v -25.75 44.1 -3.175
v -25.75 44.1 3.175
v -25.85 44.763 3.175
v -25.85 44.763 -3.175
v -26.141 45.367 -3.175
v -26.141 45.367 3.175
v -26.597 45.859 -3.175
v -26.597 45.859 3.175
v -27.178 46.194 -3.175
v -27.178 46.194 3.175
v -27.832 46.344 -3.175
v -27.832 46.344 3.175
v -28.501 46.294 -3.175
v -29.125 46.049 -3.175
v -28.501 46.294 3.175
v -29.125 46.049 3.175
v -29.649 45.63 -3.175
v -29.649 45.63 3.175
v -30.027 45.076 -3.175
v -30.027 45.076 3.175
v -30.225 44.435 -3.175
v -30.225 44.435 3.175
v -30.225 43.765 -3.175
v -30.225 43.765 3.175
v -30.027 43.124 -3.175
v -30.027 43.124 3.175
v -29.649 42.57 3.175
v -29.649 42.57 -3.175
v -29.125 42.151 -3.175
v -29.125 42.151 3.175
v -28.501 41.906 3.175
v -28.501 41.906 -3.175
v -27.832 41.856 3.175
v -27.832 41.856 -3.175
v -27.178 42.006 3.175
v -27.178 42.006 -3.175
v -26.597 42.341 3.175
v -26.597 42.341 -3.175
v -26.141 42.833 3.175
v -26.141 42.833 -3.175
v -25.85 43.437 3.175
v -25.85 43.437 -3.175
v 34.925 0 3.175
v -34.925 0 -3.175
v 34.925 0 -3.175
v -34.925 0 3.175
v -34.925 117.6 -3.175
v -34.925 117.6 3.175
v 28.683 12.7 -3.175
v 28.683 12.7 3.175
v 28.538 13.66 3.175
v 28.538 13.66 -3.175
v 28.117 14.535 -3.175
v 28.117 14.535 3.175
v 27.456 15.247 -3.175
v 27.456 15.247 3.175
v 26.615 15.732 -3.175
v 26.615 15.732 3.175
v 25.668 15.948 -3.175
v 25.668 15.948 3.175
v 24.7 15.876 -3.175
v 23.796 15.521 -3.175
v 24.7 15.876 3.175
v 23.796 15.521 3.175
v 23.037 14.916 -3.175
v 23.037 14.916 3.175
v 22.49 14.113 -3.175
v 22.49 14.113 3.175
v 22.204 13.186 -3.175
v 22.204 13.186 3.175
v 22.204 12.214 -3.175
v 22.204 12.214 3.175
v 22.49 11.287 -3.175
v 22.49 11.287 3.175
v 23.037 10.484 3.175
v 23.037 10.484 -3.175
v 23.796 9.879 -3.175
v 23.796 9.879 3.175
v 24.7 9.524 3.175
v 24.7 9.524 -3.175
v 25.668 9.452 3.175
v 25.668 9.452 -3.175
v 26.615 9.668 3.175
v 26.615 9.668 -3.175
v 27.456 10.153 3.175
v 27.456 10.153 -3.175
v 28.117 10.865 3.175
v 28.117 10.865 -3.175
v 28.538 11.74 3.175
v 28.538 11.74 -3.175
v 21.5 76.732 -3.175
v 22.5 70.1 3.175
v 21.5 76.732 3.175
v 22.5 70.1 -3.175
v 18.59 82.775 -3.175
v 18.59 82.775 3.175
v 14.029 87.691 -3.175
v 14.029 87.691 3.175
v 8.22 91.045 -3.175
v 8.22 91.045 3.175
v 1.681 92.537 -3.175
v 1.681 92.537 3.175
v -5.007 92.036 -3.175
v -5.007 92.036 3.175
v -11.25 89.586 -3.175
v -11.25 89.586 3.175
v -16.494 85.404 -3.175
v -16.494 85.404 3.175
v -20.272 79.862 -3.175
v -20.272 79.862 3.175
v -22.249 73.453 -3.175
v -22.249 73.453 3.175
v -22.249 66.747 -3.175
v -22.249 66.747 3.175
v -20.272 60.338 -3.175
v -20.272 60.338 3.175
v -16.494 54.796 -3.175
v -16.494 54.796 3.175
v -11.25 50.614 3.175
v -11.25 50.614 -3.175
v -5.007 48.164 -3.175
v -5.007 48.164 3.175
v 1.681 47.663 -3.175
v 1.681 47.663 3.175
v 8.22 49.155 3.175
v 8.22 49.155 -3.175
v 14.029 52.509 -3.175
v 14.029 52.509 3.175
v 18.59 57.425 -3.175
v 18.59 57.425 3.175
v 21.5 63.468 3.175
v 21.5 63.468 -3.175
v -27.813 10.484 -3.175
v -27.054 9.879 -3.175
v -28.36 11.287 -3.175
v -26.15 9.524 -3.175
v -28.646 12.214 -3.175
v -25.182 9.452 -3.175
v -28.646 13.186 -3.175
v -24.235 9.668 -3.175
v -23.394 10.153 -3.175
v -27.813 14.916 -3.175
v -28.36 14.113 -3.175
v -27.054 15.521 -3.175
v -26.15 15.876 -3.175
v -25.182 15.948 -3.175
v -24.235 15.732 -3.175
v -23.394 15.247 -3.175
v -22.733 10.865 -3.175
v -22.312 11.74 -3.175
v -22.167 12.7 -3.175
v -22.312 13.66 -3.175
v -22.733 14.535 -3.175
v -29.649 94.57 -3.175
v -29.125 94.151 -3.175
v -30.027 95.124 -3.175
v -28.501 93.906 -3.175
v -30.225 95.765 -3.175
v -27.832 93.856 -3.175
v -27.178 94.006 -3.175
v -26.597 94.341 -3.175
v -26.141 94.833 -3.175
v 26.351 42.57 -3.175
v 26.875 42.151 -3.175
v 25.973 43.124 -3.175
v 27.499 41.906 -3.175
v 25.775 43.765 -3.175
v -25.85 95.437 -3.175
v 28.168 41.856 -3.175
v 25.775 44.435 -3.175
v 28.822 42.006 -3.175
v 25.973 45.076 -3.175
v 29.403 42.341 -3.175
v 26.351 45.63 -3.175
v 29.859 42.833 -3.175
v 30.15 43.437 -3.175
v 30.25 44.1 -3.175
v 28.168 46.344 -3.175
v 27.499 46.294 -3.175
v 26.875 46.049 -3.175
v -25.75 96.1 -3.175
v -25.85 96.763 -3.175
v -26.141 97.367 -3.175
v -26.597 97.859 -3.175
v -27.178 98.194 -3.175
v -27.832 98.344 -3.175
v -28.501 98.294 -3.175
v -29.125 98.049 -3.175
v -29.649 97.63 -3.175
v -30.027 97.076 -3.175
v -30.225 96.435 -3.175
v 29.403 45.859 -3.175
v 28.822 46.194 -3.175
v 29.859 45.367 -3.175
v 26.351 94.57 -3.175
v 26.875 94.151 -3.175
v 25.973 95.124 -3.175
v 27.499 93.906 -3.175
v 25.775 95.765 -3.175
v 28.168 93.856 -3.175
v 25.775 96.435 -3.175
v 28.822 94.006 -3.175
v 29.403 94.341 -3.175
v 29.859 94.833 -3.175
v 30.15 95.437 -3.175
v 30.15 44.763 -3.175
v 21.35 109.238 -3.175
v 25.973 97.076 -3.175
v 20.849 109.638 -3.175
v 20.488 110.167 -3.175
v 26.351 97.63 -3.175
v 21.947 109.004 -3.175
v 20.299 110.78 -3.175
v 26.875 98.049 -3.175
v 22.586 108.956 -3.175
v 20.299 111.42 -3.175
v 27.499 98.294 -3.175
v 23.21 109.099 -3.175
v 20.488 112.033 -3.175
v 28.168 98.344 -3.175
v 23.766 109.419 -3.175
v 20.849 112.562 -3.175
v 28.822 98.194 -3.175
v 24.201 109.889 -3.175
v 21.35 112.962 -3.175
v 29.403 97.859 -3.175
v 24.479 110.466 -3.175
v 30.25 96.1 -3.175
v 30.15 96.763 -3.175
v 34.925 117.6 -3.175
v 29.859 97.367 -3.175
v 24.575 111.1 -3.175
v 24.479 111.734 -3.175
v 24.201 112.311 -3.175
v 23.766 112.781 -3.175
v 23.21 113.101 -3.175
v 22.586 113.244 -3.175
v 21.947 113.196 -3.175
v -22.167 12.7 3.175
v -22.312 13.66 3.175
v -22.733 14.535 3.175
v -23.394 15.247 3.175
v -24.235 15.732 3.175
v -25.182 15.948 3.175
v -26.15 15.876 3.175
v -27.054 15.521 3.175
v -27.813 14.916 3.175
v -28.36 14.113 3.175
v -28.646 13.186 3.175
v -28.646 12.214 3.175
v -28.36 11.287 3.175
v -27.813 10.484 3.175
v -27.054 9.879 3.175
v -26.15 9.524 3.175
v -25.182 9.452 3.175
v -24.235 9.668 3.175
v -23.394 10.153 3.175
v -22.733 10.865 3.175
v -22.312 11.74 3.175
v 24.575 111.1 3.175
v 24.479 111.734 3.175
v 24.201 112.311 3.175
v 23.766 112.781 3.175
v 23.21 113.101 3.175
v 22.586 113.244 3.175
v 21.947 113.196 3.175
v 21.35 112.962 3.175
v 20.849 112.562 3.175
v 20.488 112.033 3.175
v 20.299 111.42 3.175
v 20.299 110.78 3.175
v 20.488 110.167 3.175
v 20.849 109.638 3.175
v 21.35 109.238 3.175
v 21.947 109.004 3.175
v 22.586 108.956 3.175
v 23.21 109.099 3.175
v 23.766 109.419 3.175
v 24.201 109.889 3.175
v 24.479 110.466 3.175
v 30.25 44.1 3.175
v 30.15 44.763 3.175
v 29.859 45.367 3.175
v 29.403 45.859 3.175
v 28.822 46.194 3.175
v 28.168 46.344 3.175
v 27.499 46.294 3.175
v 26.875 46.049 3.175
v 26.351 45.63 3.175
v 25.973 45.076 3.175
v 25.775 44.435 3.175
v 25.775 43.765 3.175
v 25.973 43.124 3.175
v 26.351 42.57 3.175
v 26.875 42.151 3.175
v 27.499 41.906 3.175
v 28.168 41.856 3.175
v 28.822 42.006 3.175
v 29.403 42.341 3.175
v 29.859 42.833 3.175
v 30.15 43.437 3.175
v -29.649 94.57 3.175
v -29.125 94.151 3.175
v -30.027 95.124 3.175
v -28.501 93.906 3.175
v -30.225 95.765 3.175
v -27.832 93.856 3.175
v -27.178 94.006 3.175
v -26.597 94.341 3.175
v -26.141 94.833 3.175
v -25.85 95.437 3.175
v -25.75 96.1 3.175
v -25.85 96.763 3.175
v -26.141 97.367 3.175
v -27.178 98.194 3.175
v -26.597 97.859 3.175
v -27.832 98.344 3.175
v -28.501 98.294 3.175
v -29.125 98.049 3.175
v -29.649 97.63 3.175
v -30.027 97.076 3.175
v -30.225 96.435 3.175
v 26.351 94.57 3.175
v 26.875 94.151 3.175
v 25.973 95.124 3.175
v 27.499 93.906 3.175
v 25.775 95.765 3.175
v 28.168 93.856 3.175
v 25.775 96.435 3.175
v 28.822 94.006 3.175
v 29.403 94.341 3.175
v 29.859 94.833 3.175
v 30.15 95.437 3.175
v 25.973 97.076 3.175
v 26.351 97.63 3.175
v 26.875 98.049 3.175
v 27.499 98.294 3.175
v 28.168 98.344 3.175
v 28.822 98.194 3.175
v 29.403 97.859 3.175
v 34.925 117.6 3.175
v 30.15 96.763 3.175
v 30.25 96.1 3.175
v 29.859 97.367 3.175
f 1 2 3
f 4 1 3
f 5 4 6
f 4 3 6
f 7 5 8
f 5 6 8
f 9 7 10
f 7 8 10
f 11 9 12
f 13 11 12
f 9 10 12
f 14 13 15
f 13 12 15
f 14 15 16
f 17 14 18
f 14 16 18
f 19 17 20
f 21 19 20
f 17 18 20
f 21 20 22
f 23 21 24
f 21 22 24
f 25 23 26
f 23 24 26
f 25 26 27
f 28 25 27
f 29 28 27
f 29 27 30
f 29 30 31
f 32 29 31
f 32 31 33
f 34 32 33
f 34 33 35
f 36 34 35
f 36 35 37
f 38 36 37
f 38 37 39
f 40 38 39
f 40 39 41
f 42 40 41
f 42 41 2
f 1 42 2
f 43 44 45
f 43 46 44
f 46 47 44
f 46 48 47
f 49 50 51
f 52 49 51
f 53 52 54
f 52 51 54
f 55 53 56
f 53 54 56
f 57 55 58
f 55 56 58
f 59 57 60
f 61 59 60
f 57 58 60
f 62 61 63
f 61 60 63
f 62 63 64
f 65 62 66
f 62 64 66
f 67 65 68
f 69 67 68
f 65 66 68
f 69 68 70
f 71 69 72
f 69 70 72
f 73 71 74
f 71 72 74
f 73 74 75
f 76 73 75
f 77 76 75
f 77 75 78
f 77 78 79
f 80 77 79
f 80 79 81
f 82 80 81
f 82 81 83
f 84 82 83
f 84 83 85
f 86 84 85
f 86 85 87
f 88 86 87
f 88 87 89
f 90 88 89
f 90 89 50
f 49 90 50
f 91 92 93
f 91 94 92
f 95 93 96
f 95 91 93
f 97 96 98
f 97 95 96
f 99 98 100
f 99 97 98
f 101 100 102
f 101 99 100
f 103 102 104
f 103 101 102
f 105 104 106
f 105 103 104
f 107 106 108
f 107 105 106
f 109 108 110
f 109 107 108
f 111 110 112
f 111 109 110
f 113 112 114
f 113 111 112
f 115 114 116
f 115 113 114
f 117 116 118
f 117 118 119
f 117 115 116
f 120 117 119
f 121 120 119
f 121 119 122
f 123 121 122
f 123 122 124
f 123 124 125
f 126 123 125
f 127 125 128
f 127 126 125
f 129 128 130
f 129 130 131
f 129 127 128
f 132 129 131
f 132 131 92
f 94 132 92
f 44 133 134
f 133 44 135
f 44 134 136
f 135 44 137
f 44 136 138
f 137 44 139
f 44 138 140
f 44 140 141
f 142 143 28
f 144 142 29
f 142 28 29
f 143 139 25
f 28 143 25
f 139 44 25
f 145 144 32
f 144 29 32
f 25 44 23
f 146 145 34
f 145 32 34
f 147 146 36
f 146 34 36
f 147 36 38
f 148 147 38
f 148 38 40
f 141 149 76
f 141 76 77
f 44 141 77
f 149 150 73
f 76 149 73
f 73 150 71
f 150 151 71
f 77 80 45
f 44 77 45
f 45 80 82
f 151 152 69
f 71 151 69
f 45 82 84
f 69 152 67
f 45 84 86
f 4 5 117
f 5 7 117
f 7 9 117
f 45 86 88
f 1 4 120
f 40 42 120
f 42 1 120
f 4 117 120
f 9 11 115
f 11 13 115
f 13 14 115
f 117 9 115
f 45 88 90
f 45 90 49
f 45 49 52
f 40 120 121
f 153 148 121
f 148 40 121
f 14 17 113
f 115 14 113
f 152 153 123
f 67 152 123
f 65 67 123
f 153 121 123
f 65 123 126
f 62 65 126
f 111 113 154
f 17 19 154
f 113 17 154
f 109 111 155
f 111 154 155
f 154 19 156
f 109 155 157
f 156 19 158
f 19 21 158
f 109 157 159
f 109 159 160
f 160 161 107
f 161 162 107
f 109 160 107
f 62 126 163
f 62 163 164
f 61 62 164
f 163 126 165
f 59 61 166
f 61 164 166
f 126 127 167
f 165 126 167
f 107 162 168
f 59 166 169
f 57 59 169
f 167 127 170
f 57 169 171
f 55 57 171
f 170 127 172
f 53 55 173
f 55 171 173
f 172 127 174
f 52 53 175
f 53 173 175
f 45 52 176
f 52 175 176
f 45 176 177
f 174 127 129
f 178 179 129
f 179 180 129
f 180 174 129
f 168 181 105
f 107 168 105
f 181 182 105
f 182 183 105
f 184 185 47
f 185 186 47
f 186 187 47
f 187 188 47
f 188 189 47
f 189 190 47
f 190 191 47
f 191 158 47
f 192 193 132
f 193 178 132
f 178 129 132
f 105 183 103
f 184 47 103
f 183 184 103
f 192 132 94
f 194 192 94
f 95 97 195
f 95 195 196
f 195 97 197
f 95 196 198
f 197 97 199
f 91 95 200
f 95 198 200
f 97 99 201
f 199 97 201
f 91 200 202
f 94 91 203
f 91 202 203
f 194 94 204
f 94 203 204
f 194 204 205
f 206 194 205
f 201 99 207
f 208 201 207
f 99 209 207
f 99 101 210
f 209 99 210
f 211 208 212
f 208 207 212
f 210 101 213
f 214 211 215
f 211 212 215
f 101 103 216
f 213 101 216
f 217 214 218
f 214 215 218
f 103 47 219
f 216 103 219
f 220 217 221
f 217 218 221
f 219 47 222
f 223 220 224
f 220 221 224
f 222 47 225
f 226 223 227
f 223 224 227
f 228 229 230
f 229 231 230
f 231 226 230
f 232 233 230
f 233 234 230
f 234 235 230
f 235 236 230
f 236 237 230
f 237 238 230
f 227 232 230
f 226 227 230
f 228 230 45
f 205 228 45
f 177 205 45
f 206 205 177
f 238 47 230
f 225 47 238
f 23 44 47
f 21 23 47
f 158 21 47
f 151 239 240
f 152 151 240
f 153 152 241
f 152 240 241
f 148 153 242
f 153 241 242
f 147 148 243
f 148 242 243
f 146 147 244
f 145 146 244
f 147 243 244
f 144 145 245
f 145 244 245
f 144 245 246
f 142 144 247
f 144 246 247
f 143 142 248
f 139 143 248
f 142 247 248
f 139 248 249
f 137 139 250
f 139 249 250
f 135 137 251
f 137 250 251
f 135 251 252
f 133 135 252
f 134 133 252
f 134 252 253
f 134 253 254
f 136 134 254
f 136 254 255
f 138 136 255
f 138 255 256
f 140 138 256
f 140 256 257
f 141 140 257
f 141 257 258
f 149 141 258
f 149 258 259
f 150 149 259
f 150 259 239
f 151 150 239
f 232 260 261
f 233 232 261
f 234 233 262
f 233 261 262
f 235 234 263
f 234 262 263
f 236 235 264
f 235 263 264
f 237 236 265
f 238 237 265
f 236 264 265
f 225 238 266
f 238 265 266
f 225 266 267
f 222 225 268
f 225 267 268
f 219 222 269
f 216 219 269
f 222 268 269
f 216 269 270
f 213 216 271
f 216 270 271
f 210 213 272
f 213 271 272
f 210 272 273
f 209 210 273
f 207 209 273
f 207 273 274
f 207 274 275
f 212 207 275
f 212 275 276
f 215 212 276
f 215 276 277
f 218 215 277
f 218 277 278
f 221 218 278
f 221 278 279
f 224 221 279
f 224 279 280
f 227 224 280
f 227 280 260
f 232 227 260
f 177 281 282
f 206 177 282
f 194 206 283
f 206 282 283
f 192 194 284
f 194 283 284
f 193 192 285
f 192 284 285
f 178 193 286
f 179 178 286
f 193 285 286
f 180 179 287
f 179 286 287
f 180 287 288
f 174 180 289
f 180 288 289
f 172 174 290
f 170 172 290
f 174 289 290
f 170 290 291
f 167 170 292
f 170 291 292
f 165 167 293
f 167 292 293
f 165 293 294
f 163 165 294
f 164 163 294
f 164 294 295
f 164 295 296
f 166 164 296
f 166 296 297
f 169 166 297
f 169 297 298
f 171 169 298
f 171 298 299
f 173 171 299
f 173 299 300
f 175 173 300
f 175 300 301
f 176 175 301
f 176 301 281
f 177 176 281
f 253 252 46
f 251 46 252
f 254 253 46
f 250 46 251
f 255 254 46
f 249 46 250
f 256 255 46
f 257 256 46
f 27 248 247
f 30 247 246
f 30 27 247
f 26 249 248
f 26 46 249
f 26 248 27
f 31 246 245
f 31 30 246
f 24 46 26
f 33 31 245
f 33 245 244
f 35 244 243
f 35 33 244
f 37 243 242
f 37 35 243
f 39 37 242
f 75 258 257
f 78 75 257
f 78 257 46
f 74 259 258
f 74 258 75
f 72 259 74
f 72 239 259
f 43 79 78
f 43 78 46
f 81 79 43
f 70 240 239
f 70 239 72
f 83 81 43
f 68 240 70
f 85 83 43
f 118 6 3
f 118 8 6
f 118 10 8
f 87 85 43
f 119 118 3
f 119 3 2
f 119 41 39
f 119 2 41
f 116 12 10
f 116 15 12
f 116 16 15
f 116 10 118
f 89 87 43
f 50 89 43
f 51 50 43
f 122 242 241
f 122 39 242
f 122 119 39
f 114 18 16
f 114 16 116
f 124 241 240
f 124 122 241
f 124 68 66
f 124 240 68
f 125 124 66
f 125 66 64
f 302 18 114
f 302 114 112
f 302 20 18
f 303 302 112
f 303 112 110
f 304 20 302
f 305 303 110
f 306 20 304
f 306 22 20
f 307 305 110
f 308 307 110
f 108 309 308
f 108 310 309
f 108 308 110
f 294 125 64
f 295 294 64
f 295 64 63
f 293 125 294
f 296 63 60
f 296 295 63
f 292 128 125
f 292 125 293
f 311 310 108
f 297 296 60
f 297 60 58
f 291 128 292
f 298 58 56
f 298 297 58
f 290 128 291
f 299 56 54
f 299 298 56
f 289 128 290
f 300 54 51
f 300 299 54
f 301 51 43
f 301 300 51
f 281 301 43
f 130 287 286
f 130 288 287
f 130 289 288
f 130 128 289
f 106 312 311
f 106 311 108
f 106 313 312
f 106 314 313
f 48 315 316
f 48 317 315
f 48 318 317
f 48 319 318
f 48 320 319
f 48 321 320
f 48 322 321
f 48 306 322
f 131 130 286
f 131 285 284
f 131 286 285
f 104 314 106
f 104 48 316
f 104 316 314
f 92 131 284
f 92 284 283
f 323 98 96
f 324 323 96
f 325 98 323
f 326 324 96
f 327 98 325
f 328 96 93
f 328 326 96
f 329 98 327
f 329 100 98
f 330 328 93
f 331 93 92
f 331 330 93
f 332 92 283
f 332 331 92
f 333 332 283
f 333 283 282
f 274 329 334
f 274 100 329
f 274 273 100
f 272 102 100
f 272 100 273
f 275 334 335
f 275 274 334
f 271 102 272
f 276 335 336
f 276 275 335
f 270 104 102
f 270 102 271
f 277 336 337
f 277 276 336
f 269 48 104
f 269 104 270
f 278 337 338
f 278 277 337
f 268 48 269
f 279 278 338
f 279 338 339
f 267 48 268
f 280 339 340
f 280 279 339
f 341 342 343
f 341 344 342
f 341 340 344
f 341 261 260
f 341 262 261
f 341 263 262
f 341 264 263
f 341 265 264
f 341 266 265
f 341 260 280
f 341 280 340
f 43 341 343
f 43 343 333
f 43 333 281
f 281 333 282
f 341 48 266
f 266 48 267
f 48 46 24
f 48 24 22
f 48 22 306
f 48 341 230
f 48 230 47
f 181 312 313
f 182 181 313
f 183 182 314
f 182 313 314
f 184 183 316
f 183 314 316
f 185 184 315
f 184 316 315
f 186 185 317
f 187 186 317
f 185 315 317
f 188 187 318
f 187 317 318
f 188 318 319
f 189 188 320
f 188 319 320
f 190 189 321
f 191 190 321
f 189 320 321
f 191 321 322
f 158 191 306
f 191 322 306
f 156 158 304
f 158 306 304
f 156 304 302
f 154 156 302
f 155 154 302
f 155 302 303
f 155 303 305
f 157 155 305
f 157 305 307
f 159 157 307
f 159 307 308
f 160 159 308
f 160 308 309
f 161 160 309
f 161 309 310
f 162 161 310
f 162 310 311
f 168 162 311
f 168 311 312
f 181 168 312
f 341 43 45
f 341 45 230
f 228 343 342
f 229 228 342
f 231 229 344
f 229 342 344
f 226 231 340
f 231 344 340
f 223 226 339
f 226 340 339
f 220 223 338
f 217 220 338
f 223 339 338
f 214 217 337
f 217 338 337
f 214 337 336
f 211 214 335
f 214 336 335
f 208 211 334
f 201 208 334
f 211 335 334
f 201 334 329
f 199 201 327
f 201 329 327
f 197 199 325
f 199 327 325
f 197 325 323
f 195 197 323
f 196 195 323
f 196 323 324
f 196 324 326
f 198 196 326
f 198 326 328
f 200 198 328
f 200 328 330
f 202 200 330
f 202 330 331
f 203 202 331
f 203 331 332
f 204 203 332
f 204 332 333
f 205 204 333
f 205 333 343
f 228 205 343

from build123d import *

# Parameters (mm, degrees)
SKETCH2_R               = 22.5
BOSS_EXTRUDE1_DEPTH     = 3.175
SKETCH3_R               = 3.25755
SKETCH3_R_2             = 2.15
CUT_EXTRUDE1_DEPTH      = 1
CUT_EXTRUDE1_DEPTH_BACK = 7.35
SKETCH4_R               = 2.25
CUT_EXTRUDE2_DEPTH      = 10


with BuildPart() as part:
    # Sketch2 → Boss-Extrude1 (new body, symmetric)
    with BuildSketch(Plane.XY):
        Polygon((-34.925, 0), (34.925, 0), (34.925, 70.1), (34.925, 102.6), (34.925, 117.6), (-34.925, 117.6), (-34.925, 102.6), (-34.925, 70.1), align=None)
        with Locations((0, 70.1)):
            Circle(SKETCH2_R, mode=Mode.SUBTRACT)
    extrude(amount=BOSS_EXTRUDE1_DEPTH, both=True)

    # Sketch3 → Cut-Extrude1 (cut, two sides)
    with BuildSketch(Plane.XY.offset(3.175)) as cut_extrude1_sk:
        with Locations((-25.425, 12.7)):
            Circle(SKETCH3_R)
        with Locations((25.425, 12.7)):
            Circle(SKETCH3_R)
        with Locations((22.425, 111.1)):
            Circle(SKETCH3_R_2)
    extrude(amount=CUT_EXTRUDE1_DEPTH, mode=Mode.SUBTRACT)
    extrude(cut_extrude1_sk.sketch, amount=-CUT_EXTRUDE1_DEPTH_BACK, mode=Mode.SUBTRACT)

    # Sketch4 → Cut-Extrude2 (cut)
    with BuildSketch(Plane.XY.offset(3.175)):
        with Locations((28, 96.1)):
            Circle(SKETCH4_R)
        with Locations((-28, 44.1)):
            Circle(SKETCH4_R)
        with Locations((28, 44.1)):
            Circle(SKETCH4_R)
        with Locations((-28, 96.1)):
            Circle(SKETCH4_R)
    extrude(amount=-CUT_EXTRUDE2_DEPTH, mode=Mode.SUBTRACT)


solid = part.part
